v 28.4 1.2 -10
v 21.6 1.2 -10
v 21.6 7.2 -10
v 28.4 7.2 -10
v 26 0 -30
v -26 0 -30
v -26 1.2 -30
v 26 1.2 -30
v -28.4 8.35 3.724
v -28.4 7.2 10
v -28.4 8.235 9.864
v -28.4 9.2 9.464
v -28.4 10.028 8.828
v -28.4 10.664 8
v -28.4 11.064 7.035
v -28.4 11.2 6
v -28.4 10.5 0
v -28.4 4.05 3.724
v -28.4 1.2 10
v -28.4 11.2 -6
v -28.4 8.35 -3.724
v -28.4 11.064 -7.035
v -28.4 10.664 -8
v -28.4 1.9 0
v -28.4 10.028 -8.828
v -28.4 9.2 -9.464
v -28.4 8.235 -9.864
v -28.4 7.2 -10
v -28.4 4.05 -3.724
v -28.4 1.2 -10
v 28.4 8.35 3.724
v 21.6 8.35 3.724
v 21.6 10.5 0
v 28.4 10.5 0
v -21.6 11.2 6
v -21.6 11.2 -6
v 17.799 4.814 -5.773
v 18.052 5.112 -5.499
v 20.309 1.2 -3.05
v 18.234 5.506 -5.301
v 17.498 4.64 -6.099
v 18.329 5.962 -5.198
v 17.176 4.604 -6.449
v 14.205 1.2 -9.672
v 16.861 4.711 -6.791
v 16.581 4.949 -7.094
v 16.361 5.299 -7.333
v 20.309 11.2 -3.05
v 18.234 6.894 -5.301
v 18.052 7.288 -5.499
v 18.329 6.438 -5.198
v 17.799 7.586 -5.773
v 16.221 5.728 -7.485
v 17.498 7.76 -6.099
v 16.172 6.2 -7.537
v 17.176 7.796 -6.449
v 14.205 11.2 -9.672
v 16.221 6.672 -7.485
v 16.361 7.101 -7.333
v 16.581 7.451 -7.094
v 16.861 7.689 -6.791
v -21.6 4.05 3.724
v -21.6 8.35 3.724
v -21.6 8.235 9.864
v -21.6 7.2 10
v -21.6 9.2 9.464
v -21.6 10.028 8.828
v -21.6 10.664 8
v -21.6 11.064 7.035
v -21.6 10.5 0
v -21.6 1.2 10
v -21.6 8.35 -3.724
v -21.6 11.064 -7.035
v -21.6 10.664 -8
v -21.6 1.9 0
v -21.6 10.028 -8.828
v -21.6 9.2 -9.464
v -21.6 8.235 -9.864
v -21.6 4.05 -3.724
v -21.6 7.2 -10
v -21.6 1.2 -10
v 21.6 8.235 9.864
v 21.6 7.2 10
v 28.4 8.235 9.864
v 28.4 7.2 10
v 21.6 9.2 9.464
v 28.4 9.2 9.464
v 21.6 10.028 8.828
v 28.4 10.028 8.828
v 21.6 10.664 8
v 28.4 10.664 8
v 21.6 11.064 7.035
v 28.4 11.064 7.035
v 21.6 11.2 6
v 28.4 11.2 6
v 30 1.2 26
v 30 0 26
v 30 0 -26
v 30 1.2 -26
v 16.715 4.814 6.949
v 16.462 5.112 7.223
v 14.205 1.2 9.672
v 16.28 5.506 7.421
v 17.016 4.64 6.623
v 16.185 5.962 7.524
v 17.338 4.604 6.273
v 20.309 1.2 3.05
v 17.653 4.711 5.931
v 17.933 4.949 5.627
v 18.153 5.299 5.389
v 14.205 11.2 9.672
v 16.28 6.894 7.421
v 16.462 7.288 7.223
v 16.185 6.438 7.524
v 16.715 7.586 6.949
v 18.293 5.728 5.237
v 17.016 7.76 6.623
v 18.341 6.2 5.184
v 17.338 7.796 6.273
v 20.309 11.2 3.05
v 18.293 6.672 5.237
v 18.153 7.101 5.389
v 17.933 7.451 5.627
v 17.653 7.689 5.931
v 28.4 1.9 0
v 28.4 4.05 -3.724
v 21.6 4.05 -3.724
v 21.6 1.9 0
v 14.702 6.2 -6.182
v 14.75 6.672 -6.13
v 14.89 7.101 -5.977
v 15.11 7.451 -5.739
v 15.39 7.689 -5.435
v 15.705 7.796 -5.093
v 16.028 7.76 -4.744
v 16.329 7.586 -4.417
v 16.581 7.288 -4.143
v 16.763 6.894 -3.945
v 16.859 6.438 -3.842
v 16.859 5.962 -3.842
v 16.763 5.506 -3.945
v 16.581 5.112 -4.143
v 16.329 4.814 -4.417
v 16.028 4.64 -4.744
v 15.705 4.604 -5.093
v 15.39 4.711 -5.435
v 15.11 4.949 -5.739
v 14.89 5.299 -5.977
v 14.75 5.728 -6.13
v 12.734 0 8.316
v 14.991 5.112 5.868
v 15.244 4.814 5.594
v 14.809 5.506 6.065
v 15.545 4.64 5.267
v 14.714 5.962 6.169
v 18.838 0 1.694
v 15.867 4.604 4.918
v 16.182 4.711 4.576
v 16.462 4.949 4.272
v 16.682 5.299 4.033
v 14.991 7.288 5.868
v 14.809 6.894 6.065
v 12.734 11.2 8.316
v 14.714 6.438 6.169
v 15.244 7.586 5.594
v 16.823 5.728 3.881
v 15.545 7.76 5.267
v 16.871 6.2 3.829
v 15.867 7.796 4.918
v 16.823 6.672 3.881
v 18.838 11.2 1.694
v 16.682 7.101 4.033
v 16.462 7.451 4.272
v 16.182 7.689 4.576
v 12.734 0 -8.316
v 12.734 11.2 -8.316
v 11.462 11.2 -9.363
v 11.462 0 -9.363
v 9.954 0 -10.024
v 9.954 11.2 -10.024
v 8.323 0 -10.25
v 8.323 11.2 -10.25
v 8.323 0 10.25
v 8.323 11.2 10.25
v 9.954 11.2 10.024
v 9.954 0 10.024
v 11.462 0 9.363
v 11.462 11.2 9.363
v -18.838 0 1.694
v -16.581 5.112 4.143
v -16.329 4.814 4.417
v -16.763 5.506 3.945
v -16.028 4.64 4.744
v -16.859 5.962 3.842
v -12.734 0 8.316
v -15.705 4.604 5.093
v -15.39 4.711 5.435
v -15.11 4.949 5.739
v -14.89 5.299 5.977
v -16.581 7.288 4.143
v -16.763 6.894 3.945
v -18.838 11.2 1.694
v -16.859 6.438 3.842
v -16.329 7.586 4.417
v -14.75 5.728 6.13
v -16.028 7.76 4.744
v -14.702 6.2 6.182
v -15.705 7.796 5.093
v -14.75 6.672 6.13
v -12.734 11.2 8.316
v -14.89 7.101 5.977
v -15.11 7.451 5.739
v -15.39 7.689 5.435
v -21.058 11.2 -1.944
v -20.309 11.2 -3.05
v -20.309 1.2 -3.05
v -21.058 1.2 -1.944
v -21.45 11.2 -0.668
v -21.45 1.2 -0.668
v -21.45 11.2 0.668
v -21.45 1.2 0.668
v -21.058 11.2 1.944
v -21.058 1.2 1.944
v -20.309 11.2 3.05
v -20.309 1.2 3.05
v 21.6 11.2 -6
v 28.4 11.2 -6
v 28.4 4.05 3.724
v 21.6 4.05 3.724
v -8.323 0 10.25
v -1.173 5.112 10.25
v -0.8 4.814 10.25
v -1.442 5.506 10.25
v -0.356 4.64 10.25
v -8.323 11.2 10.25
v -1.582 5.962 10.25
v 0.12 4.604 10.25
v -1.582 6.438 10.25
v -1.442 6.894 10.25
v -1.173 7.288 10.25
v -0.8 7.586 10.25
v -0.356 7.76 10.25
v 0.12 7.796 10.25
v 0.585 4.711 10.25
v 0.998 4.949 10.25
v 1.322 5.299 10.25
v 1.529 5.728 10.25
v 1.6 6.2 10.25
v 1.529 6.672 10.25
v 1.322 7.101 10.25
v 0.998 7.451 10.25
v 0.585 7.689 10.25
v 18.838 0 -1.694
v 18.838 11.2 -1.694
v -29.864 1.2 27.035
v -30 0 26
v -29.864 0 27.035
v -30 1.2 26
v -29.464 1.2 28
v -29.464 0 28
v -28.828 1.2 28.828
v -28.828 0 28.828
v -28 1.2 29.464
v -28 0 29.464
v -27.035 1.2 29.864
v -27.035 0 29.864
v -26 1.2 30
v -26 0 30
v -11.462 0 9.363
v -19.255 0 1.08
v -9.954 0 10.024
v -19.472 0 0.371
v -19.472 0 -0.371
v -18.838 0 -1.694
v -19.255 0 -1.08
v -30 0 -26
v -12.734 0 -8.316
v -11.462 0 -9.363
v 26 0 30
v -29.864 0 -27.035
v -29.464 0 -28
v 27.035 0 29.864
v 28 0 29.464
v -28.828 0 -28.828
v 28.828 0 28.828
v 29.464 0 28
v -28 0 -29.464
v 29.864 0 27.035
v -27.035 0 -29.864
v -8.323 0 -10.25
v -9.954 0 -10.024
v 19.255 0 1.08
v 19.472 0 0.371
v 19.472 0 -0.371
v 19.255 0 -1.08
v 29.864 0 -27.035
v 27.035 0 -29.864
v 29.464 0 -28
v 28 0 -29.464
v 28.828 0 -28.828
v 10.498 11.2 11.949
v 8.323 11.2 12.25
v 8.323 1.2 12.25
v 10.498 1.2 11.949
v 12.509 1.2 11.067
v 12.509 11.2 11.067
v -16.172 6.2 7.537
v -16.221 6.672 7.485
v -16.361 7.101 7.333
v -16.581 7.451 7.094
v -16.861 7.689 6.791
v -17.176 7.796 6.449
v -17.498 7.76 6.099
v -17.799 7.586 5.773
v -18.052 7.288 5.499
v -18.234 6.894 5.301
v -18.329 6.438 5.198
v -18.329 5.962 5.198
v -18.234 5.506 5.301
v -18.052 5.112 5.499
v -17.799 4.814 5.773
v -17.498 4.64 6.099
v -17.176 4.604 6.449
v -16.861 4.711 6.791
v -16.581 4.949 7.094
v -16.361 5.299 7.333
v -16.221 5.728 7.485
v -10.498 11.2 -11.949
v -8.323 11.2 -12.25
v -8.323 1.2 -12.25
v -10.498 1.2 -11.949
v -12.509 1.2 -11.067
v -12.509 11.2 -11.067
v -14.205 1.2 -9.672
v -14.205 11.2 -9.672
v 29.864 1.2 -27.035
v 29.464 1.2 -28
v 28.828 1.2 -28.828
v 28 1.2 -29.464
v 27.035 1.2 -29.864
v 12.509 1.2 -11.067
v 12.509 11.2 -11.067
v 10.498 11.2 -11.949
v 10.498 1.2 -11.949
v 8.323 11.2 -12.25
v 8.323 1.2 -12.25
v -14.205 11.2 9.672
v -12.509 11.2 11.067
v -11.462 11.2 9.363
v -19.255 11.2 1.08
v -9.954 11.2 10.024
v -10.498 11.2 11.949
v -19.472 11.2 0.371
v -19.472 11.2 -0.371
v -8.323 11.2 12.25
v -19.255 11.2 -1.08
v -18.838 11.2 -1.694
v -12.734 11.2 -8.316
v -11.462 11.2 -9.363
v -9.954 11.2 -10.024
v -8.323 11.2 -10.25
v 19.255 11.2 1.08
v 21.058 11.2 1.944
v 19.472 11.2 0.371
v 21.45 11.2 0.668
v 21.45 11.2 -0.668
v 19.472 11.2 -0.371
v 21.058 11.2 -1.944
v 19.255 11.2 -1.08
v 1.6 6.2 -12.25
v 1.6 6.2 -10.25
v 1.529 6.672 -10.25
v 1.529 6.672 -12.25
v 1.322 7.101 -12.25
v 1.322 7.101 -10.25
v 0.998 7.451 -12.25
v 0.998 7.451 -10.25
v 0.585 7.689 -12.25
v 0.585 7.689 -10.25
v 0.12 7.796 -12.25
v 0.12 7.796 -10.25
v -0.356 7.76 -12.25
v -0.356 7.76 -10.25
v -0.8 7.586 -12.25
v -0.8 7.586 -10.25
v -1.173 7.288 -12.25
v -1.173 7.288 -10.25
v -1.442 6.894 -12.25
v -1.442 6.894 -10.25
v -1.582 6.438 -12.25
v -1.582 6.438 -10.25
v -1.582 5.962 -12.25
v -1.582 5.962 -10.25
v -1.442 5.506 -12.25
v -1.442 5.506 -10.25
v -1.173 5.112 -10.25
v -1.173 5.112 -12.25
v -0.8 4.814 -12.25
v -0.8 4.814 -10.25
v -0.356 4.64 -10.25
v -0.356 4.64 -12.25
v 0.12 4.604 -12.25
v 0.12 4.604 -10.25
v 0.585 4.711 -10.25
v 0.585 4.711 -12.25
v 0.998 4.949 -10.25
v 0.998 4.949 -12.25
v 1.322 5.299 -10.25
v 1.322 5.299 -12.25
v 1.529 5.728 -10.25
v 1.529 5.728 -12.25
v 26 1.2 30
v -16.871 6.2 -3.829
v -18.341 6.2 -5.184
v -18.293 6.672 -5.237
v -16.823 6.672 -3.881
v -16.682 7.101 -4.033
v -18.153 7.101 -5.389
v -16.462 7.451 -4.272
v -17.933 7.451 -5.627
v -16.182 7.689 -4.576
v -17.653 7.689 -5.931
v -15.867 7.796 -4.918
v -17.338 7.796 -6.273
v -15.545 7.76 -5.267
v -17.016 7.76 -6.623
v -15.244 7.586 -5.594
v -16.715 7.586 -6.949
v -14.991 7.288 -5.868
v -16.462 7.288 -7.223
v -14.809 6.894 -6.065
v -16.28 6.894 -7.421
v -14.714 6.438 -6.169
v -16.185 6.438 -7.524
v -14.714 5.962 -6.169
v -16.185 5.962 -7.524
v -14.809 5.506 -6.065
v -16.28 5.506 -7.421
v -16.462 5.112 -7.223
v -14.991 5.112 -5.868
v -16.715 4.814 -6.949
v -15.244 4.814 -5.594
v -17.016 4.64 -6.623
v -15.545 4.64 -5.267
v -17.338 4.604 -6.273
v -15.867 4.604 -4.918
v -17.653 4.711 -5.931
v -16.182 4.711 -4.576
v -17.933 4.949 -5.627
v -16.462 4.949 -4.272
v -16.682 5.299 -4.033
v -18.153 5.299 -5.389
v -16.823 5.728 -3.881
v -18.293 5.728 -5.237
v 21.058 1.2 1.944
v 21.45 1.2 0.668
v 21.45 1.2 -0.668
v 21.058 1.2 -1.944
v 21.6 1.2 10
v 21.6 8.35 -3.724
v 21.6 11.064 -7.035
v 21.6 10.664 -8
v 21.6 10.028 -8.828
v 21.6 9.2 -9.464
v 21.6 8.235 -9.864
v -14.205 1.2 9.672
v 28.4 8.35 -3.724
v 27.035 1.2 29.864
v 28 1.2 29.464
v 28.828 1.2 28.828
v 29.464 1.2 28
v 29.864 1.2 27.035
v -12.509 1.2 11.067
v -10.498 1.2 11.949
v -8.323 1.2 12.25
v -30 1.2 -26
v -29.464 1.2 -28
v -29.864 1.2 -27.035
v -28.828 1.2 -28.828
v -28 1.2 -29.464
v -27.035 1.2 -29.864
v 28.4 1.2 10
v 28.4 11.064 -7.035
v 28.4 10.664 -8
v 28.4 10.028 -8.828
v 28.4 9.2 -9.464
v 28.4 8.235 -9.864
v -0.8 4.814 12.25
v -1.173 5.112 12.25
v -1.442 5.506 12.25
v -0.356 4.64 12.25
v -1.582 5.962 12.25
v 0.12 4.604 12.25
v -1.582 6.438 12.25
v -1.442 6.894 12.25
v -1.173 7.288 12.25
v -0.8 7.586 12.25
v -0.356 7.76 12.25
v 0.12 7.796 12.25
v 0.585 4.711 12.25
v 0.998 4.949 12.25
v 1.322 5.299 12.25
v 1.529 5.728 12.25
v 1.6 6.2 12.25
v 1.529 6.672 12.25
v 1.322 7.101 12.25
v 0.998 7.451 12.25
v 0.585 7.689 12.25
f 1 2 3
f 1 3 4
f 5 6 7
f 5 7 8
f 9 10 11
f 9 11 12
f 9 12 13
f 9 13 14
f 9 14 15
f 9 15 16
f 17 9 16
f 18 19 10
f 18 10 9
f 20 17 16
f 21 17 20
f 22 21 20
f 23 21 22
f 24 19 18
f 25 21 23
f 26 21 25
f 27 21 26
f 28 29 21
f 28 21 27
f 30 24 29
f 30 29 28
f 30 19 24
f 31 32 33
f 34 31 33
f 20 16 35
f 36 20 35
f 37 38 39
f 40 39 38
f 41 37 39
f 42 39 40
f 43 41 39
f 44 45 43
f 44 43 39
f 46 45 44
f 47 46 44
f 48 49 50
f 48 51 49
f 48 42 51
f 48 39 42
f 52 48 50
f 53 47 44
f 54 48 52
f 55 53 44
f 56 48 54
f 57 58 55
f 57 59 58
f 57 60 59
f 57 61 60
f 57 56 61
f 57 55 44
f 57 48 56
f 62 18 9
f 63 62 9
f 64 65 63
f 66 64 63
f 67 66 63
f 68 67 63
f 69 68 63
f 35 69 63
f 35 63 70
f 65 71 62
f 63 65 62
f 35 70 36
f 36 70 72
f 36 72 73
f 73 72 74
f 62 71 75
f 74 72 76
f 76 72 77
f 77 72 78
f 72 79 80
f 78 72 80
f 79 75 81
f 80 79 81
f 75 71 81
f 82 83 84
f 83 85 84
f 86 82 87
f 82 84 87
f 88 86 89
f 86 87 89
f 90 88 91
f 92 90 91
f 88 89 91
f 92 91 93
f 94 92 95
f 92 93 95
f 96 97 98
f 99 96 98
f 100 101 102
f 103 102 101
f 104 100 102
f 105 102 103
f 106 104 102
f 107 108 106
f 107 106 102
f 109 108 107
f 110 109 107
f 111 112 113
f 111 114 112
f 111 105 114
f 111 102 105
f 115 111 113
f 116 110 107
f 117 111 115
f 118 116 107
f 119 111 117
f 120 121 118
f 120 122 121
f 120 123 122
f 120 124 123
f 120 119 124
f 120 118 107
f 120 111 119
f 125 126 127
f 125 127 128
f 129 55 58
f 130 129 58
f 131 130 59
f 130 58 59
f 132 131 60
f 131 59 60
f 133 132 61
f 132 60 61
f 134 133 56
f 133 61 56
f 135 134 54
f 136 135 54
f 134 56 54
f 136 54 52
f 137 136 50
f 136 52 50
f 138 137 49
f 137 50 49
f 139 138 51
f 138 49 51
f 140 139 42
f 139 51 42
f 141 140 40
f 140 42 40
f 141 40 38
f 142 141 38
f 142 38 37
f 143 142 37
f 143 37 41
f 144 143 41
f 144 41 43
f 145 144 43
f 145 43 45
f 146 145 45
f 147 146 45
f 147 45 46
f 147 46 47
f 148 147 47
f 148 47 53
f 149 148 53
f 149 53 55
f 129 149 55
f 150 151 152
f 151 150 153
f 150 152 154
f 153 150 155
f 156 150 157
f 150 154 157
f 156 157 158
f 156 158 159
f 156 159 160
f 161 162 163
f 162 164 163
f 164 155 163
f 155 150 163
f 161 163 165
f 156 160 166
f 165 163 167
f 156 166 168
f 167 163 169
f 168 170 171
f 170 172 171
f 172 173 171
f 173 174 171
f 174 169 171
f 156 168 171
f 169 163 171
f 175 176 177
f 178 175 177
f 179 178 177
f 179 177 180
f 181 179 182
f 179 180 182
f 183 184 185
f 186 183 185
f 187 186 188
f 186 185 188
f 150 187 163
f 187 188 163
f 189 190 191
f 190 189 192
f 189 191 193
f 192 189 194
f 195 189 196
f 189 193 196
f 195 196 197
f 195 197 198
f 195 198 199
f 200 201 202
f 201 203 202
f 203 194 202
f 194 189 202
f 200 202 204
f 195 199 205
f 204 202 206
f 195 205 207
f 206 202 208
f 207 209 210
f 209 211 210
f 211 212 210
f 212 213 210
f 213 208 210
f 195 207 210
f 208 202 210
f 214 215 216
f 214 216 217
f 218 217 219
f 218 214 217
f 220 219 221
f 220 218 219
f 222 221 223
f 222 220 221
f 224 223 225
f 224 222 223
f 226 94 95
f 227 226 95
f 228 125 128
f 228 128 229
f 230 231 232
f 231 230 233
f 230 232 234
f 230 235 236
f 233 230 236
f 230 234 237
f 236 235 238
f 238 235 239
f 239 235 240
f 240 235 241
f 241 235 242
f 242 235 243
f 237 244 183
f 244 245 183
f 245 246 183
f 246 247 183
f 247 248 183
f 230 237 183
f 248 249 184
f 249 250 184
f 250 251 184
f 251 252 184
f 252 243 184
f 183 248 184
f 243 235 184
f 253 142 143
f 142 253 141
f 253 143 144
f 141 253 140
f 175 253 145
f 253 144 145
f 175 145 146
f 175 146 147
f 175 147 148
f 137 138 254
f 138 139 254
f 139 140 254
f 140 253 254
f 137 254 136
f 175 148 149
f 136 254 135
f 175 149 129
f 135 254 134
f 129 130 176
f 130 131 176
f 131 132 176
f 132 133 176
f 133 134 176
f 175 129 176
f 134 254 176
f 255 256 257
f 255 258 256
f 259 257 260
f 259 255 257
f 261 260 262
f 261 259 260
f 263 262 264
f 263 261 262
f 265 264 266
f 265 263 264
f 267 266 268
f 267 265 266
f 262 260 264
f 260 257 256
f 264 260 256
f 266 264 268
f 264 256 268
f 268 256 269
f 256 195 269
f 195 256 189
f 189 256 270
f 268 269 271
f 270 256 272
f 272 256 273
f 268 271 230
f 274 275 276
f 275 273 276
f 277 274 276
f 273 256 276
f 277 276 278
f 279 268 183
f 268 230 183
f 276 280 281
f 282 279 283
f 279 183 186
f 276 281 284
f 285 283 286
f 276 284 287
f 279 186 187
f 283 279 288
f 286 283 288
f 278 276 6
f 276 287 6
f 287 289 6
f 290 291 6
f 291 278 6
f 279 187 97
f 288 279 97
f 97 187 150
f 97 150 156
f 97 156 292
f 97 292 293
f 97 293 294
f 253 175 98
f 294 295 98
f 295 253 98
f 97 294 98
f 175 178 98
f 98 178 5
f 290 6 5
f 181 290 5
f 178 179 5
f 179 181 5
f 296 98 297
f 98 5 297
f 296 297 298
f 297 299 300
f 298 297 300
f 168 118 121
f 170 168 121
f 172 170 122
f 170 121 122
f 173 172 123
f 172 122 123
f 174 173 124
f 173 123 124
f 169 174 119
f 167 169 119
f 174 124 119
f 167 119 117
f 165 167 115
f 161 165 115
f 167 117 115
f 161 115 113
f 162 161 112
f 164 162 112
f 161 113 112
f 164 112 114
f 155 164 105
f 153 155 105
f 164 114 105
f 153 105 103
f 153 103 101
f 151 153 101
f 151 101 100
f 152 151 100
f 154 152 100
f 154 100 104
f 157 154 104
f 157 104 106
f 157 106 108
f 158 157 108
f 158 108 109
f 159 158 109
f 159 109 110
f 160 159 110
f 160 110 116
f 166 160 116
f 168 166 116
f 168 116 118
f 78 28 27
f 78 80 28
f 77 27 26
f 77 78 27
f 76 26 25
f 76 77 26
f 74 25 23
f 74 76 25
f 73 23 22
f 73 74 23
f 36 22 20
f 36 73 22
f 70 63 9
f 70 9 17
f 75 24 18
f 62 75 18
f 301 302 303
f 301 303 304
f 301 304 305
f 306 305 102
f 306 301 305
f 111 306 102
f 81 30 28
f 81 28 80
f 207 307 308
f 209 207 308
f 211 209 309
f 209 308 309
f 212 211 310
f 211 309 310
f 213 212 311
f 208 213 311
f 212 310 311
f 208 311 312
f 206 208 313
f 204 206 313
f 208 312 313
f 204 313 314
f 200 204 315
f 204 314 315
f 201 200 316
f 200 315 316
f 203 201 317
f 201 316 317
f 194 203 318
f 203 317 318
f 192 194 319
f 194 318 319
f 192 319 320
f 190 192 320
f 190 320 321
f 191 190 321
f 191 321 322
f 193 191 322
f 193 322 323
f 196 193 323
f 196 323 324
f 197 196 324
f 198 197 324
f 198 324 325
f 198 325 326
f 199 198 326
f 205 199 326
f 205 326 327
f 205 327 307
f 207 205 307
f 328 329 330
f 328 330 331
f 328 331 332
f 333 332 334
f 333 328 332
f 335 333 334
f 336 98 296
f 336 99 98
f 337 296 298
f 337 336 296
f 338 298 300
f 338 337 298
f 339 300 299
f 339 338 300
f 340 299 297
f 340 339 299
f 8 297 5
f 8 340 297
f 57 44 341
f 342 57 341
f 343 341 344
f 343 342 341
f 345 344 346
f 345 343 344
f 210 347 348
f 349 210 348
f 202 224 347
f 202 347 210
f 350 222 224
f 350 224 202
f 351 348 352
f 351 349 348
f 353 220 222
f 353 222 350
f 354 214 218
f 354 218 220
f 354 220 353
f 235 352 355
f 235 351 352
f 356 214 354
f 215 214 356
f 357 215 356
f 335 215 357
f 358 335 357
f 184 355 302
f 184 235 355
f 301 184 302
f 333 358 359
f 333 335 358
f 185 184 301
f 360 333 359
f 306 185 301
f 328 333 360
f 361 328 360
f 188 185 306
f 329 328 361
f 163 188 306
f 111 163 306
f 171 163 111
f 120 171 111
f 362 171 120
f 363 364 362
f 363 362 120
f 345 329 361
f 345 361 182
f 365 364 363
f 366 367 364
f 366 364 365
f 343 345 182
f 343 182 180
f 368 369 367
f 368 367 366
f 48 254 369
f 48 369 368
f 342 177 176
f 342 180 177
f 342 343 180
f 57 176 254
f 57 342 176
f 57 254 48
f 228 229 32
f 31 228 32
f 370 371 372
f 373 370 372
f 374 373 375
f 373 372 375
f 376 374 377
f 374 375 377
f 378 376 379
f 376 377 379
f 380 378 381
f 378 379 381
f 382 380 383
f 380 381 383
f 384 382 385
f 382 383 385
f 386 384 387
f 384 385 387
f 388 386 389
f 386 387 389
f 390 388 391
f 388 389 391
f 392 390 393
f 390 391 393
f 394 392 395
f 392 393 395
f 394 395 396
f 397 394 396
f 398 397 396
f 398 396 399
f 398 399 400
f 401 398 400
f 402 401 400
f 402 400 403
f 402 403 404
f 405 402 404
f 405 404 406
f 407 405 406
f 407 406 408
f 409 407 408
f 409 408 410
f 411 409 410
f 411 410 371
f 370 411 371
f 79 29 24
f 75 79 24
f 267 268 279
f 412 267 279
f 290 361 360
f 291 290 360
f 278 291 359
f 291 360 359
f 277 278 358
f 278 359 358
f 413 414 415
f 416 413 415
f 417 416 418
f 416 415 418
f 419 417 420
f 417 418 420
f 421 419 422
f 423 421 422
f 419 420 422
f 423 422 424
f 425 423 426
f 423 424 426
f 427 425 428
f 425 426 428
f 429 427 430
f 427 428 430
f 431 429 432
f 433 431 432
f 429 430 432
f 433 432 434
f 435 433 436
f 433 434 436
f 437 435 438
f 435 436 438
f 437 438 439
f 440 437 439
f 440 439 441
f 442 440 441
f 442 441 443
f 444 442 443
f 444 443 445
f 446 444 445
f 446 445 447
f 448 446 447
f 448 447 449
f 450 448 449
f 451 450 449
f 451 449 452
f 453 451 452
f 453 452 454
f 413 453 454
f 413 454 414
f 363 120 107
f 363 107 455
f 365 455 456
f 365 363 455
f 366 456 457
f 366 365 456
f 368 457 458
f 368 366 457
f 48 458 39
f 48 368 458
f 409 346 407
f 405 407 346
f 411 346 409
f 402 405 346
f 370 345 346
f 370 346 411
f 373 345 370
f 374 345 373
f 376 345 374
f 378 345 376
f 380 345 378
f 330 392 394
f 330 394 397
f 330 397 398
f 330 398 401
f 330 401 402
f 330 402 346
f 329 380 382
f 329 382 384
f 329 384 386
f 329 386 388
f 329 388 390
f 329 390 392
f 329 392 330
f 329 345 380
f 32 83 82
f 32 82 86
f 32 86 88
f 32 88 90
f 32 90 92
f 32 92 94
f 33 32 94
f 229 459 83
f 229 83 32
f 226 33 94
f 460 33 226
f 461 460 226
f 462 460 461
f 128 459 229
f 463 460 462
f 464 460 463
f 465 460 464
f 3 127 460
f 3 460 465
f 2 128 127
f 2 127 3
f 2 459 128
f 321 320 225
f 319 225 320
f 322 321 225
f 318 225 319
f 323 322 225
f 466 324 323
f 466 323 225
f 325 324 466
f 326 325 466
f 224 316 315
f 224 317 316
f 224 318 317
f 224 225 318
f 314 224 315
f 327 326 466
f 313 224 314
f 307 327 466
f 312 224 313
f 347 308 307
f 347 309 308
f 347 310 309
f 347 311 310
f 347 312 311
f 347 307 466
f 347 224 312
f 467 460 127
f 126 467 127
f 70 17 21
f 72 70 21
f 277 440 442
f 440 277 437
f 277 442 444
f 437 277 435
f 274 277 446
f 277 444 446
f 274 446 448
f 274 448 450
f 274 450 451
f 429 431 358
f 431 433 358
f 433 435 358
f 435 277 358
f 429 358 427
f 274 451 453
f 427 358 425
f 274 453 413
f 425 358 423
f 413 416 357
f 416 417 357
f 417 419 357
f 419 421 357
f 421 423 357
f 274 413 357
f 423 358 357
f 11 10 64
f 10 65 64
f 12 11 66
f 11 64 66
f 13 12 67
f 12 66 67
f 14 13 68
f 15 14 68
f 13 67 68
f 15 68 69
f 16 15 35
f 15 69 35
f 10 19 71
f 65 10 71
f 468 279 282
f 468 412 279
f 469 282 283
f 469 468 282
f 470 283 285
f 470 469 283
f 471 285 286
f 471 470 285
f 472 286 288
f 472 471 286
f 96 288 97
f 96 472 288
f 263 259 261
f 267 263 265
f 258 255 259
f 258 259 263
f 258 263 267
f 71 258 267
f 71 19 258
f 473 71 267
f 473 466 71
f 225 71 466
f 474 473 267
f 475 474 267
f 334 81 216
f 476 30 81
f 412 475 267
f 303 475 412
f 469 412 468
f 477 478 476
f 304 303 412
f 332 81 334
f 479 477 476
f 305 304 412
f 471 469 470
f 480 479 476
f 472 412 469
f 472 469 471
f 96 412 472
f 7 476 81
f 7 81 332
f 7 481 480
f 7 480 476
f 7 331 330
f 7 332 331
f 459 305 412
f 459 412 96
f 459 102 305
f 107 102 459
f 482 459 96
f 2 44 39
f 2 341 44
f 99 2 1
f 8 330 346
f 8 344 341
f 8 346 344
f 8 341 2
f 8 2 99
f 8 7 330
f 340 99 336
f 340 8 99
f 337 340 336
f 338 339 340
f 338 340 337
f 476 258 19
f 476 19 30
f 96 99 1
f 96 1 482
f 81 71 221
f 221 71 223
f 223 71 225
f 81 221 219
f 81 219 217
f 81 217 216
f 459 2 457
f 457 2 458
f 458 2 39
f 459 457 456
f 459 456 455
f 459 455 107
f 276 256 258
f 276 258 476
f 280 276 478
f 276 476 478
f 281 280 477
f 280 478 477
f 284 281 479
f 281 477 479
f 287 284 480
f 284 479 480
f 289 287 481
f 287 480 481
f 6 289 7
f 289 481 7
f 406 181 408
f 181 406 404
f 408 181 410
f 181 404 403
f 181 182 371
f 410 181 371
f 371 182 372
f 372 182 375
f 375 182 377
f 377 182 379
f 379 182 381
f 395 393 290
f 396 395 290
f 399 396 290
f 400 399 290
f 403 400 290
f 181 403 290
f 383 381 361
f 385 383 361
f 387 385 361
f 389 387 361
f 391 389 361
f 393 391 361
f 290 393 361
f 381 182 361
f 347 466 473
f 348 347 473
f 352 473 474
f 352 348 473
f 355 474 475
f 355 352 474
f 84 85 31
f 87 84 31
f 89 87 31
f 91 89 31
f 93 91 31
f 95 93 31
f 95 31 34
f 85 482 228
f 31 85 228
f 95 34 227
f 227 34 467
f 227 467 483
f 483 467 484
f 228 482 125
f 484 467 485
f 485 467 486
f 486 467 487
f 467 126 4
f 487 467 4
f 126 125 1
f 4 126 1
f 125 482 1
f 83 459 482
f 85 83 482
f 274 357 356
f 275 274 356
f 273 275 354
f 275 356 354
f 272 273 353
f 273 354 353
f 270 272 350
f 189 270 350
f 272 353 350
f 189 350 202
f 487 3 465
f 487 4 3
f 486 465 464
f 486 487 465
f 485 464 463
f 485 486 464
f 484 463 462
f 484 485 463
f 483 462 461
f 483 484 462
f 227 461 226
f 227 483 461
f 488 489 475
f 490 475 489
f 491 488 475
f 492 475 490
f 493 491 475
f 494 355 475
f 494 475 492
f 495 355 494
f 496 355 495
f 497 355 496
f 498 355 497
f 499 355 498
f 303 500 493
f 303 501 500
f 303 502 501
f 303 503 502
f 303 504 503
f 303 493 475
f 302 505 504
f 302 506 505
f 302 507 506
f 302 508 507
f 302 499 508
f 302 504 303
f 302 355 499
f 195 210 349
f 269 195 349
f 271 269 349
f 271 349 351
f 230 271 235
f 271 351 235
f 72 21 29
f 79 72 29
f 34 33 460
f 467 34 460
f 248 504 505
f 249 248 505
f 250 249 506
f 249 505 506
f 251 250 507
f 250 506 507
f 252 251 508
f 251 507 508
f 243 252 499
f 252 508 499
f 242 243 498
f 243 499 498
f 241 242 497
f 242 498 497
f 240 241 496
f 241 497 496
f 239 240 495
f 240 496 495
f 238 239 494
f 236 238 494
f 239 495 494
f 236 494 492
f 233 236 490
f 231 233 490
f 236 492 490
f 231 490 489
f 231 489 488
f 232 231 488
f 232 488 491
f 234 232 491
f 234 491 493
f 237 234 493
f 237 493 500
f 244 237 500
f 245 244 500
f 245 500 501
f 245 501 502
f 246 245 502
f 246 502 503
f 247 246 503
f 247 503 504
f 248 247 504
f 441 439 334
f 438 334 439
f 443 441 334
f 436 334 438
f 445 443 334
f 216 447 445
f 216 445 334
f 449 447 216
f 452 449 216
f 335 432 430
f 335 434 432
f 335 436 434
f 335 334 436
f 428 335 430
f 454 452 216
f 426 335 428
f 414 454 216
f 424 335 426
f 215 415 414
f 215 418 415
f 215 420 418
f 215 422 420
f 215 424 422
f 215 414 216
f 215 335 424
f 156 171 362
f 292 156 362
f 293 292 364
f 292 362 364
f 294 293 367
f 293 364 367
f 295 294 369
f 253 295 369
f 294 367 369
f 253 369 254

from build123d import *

# Parameters (mm, degrees)
SKETCH1_W           = 60
SKETCH1_H           = 60
BOSS_EXTRUDE1_DEPTH = 1.2
FILLET1_R           = 4
SKETCH3_W           = 6.8
SKETCH3_H           = 20
BOSS_EXTRUDE3_DEPTH = 10
FILLET2_R           = 4
CUT_EXTRUDE1_DEPTH  = 100
CUT_EXTRUDE2_DEPTH  = 44.588989435
BOSS_EXTRUDE4_START = 10
BOSS_EXTRUDE4_DEPTH = 10
CUT_EXTRUDE4_REACH  = 55.014
SKETCH6_R           = 1.6
CUT_EXTRUDE5_REACH  = 62.463
SKETCH7_R           = 1.6
CUT_EXTRUDE6_REACH  = 62.463
SKETCH8_R           = 1.6
CUT_EXTRUDE7_REACH  = 62.463
SKETCH9_R           = 1.6
CUT_EXTRUDE8_REACH  = 62.463
SKETCH10_R          = 1.6


with BuildPart() as part:
    # Sketch1 → Boss-Extrude1 (new body)
    with BuildSketch(Plane(origin=(0, 0, 0), x_dir=(1, 0, 0), z_dir=(0, 1, 0))):
        Rectangle(SKETCH1_W, SKETCH1_H)
    extrude(amount=BOSS_EXTRUDE1_DEPTH)

    # Fillet1
    fillet1_edges = [part.edges().sort_by_distance(p)[0] for p in [
        (30, 0.6, 30),
        (-30, 0.6, 30),
        (-30, 0.6, -30),
        (30, 0.6, -30),
    ]]
    fillet(fillet1_edges, radius=FILLET1_R)

    # Sketch3 → Boss-Extrude3 (add)
    with BuildSketch(Plane(origin=(0, 1.2, 0), x_dir=(1, 0, 0), z_dir=(0, 1, 0))):
        with Locations((-25, 0)):
            Rectangle(SKETCH3_W, SKETCH3_H)
        with Locations((25, 0)):
            Rectangle(SKETCH3_W, SKETCH3_H)
    extrude(amount=BOSS_EXTRUDE3_DEPTH)

    # Fillet2
    fillet2_edges = [part.edges().sort_by_distance(p)[0] for p in [
        (-25, 11.2, -10),
        (-25, 11.2, 10),
        (25, 11.2, 10),
        (25, 11.2, -10),
    ]]
    fillet(fillet2_edges, radius=FILLET2_R)

    # Sketch4 → Cut-Extrude1 (cut)
    with BuildSketch(Plane.ZY.offset(28.4)):
        Polygon((0, 1.9), (0, 10.5), (-3.723909236, 8.35), (-3.723909236, 4.05), align=None)
        Polygon((3.723909236, 8.35), (0, 10.5), (0, 1.9), (3.723909236, 4.05), align=None)
    extrude(amount=-CUT_EXTRUDE1_DEPTH, mode=Mode.SUBTRACT)

    # Sketch5 → Cut-Extrude2 (cut, through all)
    with BuildSketch(Plane(origin=(0, 1.2, 0), x_dir=(1, 0, 0), z_dir=(0, 1, 0))):
        with BuildLine():
            Line((18.838235294, 1.694370386), (12.734380374, 8.316488925))
            ThreePointArc((12.734380374, 8.316488925), (10.731045286, 9.74540415), (8.322615669, 10.25))
            Line((8.322615669, 10.25), (-8.322615669, 10.25))
            ThreePointArc((-8.322615669, 10.25), (-10.731045286, 9.74540415), (-12.734380374, 8.316488925))
            Line((-12.734380374, 8.316488925), (-18.838235294, 1.694370386))
            ThreePointArc((-18.838235294, 1.694370386), (-19.5, 0), (-18.838235294, -1.694370386))
            Line((-18.838235294, -1.694370386), (-12.734380374, -8.316488925))
            ThreePointArc((-12.734380374, -8.316488925), (-10.731045286, -9.74540415), (-8.322615669, -10.25))
            Line((-8.322615669, -10.25), (8.322615669, -10.25))
            ThreePointArc((8.322615669, -10.25), (10.731045286, -9.74540415), (12.734380374, -8.316488925))
            Line((12.734380374, -8.316488925), (18.838235294, -1.694370386))
            ThreePointArc((18.838235294, -1.694370386), (19.5, 0), (18.838235294, 1.694370386))
        make_face()
    extrude(amount=-CUT_EXTRUDE2_DEPTH, mode=Mode.SUBTRACT)

    # Sketch5<3> → Boss-Extrude4 (add)
    with BuildSketch(Plane(origin=(0, 1.2, 0), x_dir=(1, 0, 0), z_dir=(0, 1, 0)).offset(BOSS_EXTRUDE4_START)):
        with BuildLine():
            Line((20.308823529, 3.049866694), (14.20496861, 9.671985234))
            ThreePointArc((14.20496861, 9.671985234), (11.533855159, 11.577205534), (8.322615669, 12.25))
            Line((8.322615669, 12.25), (-8.322615669, 12.25))
            ThreePointArc((-8.322615669, 12.25), (-11.533855159, 11.577205534), (-14.20496861, 9.671985234))
            Line((-14.20496861, 9.671985234), (-20.308823529, 3.049866694))
            ThreePointArc((-20.308823529, 3.049866694), (-21.5, 0), (-20.308823529, -3.049866694))
            Line((-20.308823529, -3.049866694), (-14.20496861, -9.671985234))
            ThreePointArc((-14.20496861, -9.671985234), (-11.533855159, -11.577205534), (-8.322615669, -12.25))
            Line((-8.322615669, -12.25), (8.322615669, -12.25))
            ThreePointArc((8.322615669, -12.25), (11.533855159, -11.577205534), (14.20496861, -9.671985234))
            Line((14.20496861, -9.671985234), (20.308823529, -3.049866694))
            ThreePointArc((20.308823529, -3.049866694), (21.5, 0), (20.308823529, 3.049866694))
        make_face()
        with BuildLine():
            Line((18.838235294, 1.694370386), (12.734380374, 8.316488925))
            ThreePointArc((12.734380374, 8.316488925), (10.731045286, 9.74540415), (8.322615669, 10.25))
            Line((8.322615669, 10.25), (-8.322615669, 10.25))
            ThreePointArc((-8.322615669, 10.25), (-10.731045286, 9.74540415), (-12.734380374, 8.316488925))
            Line((-12.734380374, 8.316488925), (-18.838235294, 1.694370386))
            ThreePointArc((-18.838235294, 1.694370386), (-19.5, 0), (-18.838235294, -1.694370386))
            Line((-18.838235294, -1.694370386), (-12.734380374, -8.316488925))
            ThreePointArc((-12.734380374, -8.316488925), (-10.731045286, -9.74540415), (-8.322615669, -10.25))
            Line((-8.322615669, -10.25), (8.322615669, -10.25))
            ThreePointArc((8.322615669, -10.25), (10.731045286, -9.74540415), (12.734380374, -8.316488925))
            Line((12.734380374, -8.316488925), (18.838235294, -1.694370386))
            ThreePointArc((18.838235294, -1.694370386), (19.5, 0), (18.838235294, 1.694370386))
        make_face(mode=Mode.SUBTRACT)
    extrude(amount=-BOSS_EXTRUDE4_DEPTH)

    # Cut-Extrude4: up to this face of the body (flat: up to its plane)
    cut_extrude4_end = Plane(part.part.faces().sort_by_distance((0, 6.2, -12.25))[0])
    # Sketch6 → Cut-Extrude4 (cut, up to the picked face)
    with BuildSketch(Plane.XY.offset(12.25), mode=Mode.PRIVATE) as cut_extrude4_sk1:
        with Locations((0, 6.2)):
            Circle(SKETCH6_R)
    cut_extrude4_tool1 = split(extrude(cut_extrude4_sk1.sketch, amount=-CUT_EXTRUDE4_REACH, mode=Mode.PRIVATE), bisect_by=cut_extrude4_end, keep=Keep.BOTH, mode=Mode.PRIVATE)
    add(cut_extrude4_tool1.solids().sort_by(Axis((0, 6.2, 12.25), (0, 0, -1)))[0], mode=Mode.SUBTRACT)

    # Sketch7 → Cut-Extrude5 (cut, up to next)
    with BuildSketch(Plane(origin=(-12.5, 0, 11.521718622), x_dir=(0.677748154223703, 0, 0.7352941176470567), z_dir=(-0.7352941176470567, 0, 0.677748154223703)), mode=Mode.PRIVATE) as cut_extrude5_sk1:
        with Locations((-7.018678015, 6.2)):
            Circle(SKETCH7_R)
    cut_extrude5_tool1 = extrude(cut_extrude5_sk1.sketch, amount=-CUT_EXTRUDE5_REACH, mode=Mode.PRIVATE) & part.part
    add(cut_extrude5_tool1.solids().sort_by_distance((-17.256896, 6.2, 6.360926))[0], mode=Mode.SUBTRACT)

    # Sketch8 → Cut-Extrude6 (cut, up to next)
    with BuildSketch(Plane(origin=(12.5, 0, 11.521718622), x_dir=(0.6777481542236974, 0, -0.735294117647062), z_dir=(0.735294117647062, 0, 0.6777481542236974)), mode=Mode.PRIVATE) as cut_extrude6_sk1:
        with Locations((7.018678015, 6.2)):
            Circle(SKETCH8_R)
    cut_extrude6_tool1 = extrude(cut_extrude6_sk1.sketch, amount=-CUT_EXTRUDE6_REACH, mode=Mode.PRIVATE) & part.part
    add(cut_extrude6_tool1.solids().sort_by_distance((17.256896, 6.2, 6.360926))[0], mode=Mode.SUBTRACT)

    # Sketch9 → Cut-Extrude7 (cut, up to next)
    with BuildSketch(Plane(origin=(-12.5, 0, -11.521718622), x_dir=(-0.6777481542236947, 0, 0.7352941176470644), z_dir=(-0.7352941176470644, 0, -0.6777481542236947)), mode=Mode.PRIVATE) as cut_extrude7_sk1:
        with Locations((7.018678015, 6.2)):
            Circle(SKETCH9_R)
    cut_extrude7_tool1 = extrude(cut_extrude7_sk1.sketch, amount=-CUT_EXTRUDE7_REACH, mode=Mode.PRIVATE) & part.part
    add(cut_extrude7_tool1.solids().sort_by_distance((-17.256896, 6.2, -6.360926))[0], mode=Mode.SUBTRACT)

    # Sketch10 → Cut-Extrude8 (cut, up to next)
    with BuildSketch(Plane(origin=(12.5, 0, -11.521718622), x_dir=(-0.6777481542237005, 0, -0.7352941176470591), z_dir=(0.7352941176470591, 0, -0.6777481542237005)), mode=Mode.PRIVATE) as cut_extrude8_sk1:
        with Locations((-7.018678015, 6.2)):
            Circle(SKETCH10_R)
    cut_extrude8_tool1 = extrude(cut_extrude8_sk1.sketch, amount=-CUT_EXTRUDE8_REACH, mode=Mode.PRIVATE) & part.part
    add(cut_extrude8_tool1.solids().sort_by_distance((17.256896, 6.2, -6.360926))[0], mode=Mode.SUBTRACT)


solid = part.part
